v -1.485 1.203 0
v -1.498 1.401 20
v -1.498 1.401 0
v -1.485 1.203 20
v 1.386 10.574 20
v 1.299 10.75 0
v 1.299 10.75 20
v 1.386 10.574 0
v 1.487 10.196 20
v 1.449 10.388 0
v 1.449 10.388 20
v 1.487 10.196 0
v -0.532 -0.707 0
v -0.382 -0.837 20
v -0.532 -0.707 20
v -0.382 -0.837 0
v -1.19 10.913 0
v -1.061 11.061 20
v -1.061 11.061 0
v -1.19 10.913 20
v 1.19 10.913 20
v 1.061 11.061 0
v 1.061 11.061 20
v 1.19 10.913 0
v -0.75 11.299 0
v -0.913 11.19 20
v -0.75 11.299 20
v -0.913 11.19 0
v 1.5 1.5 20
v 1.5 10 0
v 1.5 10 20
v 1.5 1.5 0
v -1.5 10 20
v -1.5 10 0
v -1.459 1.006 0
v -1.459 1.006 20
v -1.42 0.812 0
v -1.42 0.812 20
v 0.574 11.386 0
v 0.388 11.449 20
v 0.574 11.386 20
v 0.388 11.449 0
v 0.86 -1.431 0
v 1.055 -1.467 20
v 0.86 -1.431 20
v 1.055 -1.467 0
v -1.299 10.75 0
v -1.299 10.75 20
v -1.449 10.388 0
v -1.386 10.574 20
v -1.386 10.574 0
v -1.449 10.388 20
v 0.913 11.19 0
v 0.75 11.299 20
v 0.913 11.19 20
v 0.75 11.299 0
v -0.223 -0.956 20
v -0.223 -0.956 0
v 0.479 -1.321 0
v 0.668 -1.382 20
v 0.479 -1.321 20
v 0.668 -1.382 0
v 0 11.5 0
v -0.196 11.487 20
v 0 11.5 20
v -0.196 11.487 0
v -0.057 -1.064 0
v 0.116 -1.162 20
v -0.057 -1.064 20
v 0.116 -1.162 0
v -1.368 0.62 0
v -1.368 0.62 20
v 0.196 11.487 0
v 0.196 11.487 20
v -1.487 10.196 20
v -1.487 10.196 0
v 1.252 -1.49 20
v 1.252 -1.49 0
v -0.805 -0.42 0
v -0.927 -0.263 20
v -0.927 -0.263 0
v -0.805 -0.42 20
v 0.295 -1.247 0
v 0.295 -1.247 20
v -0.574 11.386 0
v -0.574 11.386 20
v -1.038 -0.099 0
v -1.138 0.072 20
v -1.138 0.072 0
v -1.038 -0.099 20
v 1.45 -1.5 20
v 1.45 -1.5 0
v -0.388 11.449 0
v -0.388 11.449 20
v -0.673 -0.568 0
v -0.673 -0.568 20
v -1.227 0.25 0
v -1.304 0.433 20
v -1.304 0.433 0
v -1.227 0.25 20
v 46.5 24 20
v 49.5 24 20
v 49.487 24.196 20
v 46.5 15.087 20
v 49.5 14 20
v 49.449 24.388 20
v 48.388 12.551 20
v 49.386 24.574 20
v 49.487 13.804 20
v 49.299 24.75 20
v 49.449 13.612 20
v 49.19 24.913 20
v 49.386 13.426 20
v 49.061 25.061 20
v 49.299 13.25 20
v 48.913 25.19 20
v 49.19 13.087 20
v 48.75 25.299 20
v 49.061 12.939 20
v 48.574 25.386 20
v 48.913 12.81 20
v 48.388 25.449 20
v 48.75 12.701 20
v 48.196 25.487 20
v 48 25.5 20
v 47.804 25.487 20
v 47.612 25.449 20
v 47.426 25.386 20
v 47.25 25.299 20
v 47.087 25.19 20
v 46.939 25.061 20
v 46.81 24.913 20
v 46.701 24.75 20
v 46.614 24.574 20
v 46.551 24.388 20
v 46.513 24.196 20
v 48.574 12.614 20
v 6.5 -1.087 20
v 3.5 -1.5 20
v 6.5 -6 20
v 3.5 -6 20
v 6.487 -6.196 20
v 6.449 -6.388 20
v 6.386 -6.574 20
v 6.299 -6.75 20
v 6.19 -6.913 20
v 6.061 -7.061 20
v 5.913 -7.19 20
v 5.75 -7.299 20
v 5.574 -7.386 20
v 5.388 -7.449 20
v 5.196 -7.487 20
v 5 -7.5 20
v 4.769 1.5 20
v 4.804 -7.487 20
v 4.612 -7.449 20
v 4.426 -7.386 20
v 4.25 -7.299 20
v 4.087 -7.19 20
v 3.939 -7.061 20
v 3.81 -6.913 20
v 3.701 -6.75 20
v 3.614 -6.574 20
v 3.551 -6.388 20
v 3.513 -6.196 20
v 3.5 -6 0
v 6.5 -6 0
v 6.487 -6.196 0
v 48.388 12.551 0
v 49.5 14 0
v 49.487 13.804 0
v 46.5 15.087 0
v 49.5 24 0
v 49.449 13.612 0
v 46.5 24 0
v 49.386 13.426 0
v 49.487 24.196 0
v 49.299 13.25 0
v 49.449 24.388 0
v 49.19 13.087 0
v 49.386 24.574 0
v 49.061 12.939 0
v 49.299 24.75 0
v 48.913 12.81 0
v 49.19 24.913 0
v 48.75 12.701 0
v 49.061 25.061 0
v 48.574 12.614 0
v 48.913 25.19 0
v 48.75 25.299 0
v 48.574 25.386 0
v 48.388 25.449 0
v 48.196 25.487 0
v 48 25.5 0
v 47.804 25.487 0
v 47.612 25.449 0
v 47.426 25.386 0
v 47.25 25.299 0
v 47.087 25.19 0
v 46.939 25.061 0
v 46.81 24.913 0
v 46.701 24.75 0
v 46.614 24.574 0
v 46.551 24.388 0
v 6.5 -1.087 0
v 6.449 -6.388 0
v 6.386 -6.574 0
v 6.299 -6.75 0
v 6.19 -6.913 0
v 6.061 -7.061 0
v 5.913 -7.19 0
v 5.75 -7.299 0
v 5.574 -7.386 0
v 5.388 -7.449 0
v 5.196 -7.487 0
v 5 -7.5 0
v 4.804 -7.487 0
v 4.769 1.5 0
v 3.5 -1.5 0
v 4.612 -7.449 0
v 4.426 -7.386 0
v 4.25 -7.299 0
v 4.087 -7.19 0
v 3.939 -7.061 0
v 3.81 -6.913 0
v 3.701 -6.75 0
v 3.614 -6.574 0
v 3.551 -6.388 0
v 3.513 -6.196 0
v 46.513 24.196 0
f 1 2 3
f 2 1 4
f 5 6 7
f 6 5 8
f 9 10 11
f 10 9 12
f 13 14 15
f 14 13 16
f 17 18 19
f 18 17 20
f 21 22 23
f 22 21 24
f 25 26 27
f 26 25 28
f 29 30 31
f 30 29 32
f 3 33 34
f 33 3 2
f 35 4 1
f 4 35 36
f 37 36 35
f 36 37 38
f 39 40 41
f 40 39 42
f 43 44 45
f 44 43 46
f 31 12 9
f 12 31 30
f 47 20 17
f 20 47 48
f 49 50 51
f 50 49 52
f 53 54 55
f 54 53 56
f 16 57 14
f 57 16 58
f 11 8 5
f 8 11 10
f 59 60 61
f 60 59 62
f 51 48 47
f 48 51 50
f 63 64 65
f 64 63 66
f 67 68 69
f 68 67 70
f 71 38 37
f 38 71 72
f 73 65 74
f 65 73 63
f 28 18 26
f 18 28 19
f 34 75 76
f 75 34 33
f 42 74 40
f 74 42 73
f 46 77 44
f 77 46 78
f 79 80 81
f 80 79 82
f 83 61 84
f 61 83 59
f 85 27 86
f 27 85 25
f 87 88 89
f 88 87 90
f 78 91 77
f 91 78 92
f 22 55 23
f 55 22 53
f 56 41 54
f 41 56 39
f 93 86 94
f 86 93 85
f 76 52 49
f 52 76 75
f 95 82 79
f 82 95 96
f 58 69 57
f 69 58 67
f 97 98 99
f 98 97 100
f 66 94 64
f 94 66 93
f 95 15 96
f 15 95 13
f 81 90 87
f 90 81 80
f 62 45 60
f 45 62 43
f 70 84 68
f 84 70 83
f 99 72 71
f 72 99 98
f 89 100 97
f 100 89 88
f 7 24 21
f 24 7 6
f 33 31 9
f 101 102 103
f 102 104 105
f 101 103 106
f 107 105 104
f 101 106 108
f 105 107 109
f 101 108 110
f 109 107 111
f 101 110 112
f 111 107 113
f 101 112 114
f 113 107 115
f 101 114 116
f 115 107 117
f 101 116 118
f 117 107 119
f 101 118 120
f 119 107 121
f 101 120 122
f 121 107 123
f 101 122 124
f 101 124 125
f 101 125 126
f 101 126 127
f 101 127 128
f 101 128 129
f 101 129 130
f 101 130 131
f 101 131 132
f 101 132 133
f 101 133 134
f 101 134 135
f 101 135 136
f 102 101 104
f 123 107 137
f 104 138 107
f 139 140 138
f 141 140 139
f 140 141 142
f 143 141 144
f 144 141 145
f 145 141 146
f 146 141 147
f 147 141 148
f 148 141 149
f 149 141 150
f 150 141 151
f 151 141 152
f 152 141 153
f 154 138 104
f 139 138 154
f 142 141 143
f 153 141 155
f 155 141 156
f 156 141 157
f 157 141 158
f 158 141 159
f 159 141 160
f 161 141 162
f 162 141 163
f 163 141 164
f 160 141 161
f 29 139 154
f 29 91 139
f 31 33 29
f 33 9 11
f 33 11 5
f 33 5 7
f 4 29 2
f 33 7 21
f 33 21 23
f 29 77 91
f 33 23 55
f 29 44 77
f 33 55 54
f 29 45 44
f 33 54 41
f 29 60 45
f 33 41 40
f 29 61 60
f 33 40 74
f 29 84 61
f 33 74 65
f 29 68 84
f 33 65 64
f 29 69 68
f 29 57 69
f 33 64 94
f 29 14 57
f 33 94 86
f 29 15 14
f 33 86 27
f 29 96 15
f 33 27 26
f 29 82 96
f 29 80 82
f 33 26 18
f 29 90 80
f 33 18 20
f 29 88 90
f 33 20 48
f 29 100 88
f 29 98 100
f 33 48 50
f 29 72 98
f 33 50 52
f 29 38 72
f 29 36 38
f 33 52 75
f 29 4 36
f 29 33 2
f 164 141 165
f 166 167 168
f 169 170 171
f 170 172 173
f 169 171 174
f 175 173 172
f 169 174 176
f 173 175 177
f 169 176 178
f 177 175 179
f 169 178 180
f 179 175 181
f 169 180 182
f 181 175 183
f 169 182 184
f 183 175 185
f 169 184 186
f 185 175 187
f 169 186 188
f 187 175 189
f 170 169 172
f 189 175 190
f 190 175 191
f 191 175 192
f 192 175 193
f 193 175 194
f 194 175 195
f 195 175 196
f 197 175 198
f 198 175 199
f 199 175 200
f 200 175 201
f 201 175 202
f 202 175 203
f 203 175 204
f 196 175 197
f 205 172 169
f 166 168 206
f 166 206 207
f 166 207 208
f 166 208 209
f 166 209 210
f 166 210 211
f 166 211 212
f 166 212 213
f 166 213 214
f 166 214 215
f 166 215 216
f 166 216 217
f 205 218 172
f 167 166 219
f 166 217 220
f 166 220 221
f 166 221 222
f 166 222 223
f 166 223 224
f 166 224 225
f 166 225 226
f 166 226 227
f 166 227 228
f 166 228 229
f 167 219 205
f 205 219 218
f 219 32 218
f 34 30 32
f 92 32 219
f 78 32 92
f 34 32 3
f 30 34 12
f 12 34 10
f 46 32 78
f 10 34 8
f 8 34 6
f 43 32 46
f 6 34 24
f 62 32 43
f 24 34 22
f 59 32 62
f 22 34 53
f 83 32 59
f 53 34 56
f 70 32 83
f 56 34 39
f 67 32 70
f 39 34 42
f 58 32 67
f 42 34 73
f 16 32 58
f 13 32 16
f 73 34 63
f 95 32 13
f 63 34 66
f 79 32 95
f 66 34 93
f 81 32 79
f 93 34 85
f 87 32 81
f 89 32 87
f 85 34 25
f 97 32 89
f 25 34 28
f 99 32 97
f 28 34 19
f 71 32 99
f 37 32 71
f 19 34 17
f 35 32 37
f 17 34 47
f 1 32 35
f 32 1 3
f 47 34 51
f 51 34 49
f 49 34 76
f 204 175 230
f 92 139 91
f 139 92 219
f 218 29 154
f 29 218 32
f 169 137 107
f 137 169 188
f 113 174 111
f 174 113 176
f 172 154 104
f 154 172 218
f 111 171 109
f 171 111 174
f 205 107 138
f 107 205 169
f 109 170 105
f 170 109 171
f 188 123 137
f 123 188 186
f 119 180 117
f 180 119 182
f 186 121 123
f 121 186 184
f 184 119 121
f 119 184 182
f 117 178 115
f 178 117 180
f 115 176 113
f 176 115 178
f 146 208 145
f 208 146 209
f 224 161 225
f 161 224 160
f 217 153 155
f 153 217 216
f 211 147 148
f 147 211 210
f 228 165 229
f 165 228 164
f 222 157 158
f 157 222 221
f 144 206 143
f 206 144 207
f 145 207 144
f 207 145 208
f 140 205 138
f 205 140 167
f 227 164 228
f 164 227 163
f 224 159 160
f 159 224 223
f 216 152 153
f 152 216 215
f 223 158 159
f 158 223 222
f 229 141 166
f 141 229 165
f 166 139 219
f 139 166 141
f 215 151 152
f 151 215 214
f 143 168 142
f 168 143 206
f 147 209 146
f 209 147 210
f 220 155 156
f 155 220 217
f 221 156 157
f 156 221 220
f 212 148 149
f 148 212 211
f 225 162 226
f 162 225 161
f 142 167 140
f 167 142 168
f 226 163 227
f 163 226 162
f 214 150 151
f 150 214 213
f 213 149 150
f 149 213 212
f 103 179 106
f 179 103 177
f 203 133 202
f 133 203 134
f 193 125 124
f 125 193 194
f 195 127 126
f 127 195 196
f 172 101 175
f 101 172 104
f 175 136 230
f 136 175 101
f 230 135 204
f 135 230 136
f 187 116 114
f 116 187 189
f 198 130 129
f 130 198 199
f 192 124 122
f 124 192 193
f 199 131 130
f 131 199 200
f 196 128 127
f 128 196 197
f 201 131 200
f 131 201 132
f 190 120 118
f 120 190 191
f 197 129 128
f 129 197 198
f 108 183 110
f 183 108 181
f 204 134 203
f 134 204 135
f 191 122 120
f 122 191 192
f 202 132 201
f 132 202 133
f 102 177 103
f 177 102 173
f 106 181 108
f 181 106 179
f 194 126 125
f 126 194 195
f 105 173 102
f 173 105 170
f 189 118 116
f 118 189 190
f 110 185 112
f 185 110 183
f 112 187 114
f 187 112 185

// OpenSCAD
//Settings.
width = 20;
length = 45;
thickness = 3;
back_hook_length = 10;
down_hook_length = 6;
front_hook_length = 10;
front_incline = 14;
steel_thickness = 2;
$fs = 0.2;
$fa = 1;

module corner() {
	cylinder(r = thickness / 2, h=width);
}
module spaced_corner() {
	intersection() {
		translate([thickness / 2, thickness / 2, 0]) {
			cylinder(r = thickness, h=width);
		}
		translate([-thickness / 2, -thickness / 2, 0]) {
			cube([thickness, thickness, width]);
		}
	}
}

hull() {
	spaced_corner();
	translate([0, back_hook_length, 0]) {
		corner();
	}
}
hull() {
	spaced_corner();
	translate([thickness + steel_thickness, 0, 0]) {
		corner();
	}
}
hull() {
	translate([thickness + steel_thickness, 0, 0]) {
		corner();
	}
	translate([thickness + length, front_incline, 0]) {
		corner();
	}
}
translate([thickness + steel_thickness, 0, 0]) {
	hull() {
		corner();
		translate([0, -down_hook_length, 0]) {
			corner();
		}
	}
}
translate([length + thickness, front_incline, 0]) {
	hull() {
		corner();
		translate([0, front_hook_length, 0]) {
			corner();
		}
	}
}
